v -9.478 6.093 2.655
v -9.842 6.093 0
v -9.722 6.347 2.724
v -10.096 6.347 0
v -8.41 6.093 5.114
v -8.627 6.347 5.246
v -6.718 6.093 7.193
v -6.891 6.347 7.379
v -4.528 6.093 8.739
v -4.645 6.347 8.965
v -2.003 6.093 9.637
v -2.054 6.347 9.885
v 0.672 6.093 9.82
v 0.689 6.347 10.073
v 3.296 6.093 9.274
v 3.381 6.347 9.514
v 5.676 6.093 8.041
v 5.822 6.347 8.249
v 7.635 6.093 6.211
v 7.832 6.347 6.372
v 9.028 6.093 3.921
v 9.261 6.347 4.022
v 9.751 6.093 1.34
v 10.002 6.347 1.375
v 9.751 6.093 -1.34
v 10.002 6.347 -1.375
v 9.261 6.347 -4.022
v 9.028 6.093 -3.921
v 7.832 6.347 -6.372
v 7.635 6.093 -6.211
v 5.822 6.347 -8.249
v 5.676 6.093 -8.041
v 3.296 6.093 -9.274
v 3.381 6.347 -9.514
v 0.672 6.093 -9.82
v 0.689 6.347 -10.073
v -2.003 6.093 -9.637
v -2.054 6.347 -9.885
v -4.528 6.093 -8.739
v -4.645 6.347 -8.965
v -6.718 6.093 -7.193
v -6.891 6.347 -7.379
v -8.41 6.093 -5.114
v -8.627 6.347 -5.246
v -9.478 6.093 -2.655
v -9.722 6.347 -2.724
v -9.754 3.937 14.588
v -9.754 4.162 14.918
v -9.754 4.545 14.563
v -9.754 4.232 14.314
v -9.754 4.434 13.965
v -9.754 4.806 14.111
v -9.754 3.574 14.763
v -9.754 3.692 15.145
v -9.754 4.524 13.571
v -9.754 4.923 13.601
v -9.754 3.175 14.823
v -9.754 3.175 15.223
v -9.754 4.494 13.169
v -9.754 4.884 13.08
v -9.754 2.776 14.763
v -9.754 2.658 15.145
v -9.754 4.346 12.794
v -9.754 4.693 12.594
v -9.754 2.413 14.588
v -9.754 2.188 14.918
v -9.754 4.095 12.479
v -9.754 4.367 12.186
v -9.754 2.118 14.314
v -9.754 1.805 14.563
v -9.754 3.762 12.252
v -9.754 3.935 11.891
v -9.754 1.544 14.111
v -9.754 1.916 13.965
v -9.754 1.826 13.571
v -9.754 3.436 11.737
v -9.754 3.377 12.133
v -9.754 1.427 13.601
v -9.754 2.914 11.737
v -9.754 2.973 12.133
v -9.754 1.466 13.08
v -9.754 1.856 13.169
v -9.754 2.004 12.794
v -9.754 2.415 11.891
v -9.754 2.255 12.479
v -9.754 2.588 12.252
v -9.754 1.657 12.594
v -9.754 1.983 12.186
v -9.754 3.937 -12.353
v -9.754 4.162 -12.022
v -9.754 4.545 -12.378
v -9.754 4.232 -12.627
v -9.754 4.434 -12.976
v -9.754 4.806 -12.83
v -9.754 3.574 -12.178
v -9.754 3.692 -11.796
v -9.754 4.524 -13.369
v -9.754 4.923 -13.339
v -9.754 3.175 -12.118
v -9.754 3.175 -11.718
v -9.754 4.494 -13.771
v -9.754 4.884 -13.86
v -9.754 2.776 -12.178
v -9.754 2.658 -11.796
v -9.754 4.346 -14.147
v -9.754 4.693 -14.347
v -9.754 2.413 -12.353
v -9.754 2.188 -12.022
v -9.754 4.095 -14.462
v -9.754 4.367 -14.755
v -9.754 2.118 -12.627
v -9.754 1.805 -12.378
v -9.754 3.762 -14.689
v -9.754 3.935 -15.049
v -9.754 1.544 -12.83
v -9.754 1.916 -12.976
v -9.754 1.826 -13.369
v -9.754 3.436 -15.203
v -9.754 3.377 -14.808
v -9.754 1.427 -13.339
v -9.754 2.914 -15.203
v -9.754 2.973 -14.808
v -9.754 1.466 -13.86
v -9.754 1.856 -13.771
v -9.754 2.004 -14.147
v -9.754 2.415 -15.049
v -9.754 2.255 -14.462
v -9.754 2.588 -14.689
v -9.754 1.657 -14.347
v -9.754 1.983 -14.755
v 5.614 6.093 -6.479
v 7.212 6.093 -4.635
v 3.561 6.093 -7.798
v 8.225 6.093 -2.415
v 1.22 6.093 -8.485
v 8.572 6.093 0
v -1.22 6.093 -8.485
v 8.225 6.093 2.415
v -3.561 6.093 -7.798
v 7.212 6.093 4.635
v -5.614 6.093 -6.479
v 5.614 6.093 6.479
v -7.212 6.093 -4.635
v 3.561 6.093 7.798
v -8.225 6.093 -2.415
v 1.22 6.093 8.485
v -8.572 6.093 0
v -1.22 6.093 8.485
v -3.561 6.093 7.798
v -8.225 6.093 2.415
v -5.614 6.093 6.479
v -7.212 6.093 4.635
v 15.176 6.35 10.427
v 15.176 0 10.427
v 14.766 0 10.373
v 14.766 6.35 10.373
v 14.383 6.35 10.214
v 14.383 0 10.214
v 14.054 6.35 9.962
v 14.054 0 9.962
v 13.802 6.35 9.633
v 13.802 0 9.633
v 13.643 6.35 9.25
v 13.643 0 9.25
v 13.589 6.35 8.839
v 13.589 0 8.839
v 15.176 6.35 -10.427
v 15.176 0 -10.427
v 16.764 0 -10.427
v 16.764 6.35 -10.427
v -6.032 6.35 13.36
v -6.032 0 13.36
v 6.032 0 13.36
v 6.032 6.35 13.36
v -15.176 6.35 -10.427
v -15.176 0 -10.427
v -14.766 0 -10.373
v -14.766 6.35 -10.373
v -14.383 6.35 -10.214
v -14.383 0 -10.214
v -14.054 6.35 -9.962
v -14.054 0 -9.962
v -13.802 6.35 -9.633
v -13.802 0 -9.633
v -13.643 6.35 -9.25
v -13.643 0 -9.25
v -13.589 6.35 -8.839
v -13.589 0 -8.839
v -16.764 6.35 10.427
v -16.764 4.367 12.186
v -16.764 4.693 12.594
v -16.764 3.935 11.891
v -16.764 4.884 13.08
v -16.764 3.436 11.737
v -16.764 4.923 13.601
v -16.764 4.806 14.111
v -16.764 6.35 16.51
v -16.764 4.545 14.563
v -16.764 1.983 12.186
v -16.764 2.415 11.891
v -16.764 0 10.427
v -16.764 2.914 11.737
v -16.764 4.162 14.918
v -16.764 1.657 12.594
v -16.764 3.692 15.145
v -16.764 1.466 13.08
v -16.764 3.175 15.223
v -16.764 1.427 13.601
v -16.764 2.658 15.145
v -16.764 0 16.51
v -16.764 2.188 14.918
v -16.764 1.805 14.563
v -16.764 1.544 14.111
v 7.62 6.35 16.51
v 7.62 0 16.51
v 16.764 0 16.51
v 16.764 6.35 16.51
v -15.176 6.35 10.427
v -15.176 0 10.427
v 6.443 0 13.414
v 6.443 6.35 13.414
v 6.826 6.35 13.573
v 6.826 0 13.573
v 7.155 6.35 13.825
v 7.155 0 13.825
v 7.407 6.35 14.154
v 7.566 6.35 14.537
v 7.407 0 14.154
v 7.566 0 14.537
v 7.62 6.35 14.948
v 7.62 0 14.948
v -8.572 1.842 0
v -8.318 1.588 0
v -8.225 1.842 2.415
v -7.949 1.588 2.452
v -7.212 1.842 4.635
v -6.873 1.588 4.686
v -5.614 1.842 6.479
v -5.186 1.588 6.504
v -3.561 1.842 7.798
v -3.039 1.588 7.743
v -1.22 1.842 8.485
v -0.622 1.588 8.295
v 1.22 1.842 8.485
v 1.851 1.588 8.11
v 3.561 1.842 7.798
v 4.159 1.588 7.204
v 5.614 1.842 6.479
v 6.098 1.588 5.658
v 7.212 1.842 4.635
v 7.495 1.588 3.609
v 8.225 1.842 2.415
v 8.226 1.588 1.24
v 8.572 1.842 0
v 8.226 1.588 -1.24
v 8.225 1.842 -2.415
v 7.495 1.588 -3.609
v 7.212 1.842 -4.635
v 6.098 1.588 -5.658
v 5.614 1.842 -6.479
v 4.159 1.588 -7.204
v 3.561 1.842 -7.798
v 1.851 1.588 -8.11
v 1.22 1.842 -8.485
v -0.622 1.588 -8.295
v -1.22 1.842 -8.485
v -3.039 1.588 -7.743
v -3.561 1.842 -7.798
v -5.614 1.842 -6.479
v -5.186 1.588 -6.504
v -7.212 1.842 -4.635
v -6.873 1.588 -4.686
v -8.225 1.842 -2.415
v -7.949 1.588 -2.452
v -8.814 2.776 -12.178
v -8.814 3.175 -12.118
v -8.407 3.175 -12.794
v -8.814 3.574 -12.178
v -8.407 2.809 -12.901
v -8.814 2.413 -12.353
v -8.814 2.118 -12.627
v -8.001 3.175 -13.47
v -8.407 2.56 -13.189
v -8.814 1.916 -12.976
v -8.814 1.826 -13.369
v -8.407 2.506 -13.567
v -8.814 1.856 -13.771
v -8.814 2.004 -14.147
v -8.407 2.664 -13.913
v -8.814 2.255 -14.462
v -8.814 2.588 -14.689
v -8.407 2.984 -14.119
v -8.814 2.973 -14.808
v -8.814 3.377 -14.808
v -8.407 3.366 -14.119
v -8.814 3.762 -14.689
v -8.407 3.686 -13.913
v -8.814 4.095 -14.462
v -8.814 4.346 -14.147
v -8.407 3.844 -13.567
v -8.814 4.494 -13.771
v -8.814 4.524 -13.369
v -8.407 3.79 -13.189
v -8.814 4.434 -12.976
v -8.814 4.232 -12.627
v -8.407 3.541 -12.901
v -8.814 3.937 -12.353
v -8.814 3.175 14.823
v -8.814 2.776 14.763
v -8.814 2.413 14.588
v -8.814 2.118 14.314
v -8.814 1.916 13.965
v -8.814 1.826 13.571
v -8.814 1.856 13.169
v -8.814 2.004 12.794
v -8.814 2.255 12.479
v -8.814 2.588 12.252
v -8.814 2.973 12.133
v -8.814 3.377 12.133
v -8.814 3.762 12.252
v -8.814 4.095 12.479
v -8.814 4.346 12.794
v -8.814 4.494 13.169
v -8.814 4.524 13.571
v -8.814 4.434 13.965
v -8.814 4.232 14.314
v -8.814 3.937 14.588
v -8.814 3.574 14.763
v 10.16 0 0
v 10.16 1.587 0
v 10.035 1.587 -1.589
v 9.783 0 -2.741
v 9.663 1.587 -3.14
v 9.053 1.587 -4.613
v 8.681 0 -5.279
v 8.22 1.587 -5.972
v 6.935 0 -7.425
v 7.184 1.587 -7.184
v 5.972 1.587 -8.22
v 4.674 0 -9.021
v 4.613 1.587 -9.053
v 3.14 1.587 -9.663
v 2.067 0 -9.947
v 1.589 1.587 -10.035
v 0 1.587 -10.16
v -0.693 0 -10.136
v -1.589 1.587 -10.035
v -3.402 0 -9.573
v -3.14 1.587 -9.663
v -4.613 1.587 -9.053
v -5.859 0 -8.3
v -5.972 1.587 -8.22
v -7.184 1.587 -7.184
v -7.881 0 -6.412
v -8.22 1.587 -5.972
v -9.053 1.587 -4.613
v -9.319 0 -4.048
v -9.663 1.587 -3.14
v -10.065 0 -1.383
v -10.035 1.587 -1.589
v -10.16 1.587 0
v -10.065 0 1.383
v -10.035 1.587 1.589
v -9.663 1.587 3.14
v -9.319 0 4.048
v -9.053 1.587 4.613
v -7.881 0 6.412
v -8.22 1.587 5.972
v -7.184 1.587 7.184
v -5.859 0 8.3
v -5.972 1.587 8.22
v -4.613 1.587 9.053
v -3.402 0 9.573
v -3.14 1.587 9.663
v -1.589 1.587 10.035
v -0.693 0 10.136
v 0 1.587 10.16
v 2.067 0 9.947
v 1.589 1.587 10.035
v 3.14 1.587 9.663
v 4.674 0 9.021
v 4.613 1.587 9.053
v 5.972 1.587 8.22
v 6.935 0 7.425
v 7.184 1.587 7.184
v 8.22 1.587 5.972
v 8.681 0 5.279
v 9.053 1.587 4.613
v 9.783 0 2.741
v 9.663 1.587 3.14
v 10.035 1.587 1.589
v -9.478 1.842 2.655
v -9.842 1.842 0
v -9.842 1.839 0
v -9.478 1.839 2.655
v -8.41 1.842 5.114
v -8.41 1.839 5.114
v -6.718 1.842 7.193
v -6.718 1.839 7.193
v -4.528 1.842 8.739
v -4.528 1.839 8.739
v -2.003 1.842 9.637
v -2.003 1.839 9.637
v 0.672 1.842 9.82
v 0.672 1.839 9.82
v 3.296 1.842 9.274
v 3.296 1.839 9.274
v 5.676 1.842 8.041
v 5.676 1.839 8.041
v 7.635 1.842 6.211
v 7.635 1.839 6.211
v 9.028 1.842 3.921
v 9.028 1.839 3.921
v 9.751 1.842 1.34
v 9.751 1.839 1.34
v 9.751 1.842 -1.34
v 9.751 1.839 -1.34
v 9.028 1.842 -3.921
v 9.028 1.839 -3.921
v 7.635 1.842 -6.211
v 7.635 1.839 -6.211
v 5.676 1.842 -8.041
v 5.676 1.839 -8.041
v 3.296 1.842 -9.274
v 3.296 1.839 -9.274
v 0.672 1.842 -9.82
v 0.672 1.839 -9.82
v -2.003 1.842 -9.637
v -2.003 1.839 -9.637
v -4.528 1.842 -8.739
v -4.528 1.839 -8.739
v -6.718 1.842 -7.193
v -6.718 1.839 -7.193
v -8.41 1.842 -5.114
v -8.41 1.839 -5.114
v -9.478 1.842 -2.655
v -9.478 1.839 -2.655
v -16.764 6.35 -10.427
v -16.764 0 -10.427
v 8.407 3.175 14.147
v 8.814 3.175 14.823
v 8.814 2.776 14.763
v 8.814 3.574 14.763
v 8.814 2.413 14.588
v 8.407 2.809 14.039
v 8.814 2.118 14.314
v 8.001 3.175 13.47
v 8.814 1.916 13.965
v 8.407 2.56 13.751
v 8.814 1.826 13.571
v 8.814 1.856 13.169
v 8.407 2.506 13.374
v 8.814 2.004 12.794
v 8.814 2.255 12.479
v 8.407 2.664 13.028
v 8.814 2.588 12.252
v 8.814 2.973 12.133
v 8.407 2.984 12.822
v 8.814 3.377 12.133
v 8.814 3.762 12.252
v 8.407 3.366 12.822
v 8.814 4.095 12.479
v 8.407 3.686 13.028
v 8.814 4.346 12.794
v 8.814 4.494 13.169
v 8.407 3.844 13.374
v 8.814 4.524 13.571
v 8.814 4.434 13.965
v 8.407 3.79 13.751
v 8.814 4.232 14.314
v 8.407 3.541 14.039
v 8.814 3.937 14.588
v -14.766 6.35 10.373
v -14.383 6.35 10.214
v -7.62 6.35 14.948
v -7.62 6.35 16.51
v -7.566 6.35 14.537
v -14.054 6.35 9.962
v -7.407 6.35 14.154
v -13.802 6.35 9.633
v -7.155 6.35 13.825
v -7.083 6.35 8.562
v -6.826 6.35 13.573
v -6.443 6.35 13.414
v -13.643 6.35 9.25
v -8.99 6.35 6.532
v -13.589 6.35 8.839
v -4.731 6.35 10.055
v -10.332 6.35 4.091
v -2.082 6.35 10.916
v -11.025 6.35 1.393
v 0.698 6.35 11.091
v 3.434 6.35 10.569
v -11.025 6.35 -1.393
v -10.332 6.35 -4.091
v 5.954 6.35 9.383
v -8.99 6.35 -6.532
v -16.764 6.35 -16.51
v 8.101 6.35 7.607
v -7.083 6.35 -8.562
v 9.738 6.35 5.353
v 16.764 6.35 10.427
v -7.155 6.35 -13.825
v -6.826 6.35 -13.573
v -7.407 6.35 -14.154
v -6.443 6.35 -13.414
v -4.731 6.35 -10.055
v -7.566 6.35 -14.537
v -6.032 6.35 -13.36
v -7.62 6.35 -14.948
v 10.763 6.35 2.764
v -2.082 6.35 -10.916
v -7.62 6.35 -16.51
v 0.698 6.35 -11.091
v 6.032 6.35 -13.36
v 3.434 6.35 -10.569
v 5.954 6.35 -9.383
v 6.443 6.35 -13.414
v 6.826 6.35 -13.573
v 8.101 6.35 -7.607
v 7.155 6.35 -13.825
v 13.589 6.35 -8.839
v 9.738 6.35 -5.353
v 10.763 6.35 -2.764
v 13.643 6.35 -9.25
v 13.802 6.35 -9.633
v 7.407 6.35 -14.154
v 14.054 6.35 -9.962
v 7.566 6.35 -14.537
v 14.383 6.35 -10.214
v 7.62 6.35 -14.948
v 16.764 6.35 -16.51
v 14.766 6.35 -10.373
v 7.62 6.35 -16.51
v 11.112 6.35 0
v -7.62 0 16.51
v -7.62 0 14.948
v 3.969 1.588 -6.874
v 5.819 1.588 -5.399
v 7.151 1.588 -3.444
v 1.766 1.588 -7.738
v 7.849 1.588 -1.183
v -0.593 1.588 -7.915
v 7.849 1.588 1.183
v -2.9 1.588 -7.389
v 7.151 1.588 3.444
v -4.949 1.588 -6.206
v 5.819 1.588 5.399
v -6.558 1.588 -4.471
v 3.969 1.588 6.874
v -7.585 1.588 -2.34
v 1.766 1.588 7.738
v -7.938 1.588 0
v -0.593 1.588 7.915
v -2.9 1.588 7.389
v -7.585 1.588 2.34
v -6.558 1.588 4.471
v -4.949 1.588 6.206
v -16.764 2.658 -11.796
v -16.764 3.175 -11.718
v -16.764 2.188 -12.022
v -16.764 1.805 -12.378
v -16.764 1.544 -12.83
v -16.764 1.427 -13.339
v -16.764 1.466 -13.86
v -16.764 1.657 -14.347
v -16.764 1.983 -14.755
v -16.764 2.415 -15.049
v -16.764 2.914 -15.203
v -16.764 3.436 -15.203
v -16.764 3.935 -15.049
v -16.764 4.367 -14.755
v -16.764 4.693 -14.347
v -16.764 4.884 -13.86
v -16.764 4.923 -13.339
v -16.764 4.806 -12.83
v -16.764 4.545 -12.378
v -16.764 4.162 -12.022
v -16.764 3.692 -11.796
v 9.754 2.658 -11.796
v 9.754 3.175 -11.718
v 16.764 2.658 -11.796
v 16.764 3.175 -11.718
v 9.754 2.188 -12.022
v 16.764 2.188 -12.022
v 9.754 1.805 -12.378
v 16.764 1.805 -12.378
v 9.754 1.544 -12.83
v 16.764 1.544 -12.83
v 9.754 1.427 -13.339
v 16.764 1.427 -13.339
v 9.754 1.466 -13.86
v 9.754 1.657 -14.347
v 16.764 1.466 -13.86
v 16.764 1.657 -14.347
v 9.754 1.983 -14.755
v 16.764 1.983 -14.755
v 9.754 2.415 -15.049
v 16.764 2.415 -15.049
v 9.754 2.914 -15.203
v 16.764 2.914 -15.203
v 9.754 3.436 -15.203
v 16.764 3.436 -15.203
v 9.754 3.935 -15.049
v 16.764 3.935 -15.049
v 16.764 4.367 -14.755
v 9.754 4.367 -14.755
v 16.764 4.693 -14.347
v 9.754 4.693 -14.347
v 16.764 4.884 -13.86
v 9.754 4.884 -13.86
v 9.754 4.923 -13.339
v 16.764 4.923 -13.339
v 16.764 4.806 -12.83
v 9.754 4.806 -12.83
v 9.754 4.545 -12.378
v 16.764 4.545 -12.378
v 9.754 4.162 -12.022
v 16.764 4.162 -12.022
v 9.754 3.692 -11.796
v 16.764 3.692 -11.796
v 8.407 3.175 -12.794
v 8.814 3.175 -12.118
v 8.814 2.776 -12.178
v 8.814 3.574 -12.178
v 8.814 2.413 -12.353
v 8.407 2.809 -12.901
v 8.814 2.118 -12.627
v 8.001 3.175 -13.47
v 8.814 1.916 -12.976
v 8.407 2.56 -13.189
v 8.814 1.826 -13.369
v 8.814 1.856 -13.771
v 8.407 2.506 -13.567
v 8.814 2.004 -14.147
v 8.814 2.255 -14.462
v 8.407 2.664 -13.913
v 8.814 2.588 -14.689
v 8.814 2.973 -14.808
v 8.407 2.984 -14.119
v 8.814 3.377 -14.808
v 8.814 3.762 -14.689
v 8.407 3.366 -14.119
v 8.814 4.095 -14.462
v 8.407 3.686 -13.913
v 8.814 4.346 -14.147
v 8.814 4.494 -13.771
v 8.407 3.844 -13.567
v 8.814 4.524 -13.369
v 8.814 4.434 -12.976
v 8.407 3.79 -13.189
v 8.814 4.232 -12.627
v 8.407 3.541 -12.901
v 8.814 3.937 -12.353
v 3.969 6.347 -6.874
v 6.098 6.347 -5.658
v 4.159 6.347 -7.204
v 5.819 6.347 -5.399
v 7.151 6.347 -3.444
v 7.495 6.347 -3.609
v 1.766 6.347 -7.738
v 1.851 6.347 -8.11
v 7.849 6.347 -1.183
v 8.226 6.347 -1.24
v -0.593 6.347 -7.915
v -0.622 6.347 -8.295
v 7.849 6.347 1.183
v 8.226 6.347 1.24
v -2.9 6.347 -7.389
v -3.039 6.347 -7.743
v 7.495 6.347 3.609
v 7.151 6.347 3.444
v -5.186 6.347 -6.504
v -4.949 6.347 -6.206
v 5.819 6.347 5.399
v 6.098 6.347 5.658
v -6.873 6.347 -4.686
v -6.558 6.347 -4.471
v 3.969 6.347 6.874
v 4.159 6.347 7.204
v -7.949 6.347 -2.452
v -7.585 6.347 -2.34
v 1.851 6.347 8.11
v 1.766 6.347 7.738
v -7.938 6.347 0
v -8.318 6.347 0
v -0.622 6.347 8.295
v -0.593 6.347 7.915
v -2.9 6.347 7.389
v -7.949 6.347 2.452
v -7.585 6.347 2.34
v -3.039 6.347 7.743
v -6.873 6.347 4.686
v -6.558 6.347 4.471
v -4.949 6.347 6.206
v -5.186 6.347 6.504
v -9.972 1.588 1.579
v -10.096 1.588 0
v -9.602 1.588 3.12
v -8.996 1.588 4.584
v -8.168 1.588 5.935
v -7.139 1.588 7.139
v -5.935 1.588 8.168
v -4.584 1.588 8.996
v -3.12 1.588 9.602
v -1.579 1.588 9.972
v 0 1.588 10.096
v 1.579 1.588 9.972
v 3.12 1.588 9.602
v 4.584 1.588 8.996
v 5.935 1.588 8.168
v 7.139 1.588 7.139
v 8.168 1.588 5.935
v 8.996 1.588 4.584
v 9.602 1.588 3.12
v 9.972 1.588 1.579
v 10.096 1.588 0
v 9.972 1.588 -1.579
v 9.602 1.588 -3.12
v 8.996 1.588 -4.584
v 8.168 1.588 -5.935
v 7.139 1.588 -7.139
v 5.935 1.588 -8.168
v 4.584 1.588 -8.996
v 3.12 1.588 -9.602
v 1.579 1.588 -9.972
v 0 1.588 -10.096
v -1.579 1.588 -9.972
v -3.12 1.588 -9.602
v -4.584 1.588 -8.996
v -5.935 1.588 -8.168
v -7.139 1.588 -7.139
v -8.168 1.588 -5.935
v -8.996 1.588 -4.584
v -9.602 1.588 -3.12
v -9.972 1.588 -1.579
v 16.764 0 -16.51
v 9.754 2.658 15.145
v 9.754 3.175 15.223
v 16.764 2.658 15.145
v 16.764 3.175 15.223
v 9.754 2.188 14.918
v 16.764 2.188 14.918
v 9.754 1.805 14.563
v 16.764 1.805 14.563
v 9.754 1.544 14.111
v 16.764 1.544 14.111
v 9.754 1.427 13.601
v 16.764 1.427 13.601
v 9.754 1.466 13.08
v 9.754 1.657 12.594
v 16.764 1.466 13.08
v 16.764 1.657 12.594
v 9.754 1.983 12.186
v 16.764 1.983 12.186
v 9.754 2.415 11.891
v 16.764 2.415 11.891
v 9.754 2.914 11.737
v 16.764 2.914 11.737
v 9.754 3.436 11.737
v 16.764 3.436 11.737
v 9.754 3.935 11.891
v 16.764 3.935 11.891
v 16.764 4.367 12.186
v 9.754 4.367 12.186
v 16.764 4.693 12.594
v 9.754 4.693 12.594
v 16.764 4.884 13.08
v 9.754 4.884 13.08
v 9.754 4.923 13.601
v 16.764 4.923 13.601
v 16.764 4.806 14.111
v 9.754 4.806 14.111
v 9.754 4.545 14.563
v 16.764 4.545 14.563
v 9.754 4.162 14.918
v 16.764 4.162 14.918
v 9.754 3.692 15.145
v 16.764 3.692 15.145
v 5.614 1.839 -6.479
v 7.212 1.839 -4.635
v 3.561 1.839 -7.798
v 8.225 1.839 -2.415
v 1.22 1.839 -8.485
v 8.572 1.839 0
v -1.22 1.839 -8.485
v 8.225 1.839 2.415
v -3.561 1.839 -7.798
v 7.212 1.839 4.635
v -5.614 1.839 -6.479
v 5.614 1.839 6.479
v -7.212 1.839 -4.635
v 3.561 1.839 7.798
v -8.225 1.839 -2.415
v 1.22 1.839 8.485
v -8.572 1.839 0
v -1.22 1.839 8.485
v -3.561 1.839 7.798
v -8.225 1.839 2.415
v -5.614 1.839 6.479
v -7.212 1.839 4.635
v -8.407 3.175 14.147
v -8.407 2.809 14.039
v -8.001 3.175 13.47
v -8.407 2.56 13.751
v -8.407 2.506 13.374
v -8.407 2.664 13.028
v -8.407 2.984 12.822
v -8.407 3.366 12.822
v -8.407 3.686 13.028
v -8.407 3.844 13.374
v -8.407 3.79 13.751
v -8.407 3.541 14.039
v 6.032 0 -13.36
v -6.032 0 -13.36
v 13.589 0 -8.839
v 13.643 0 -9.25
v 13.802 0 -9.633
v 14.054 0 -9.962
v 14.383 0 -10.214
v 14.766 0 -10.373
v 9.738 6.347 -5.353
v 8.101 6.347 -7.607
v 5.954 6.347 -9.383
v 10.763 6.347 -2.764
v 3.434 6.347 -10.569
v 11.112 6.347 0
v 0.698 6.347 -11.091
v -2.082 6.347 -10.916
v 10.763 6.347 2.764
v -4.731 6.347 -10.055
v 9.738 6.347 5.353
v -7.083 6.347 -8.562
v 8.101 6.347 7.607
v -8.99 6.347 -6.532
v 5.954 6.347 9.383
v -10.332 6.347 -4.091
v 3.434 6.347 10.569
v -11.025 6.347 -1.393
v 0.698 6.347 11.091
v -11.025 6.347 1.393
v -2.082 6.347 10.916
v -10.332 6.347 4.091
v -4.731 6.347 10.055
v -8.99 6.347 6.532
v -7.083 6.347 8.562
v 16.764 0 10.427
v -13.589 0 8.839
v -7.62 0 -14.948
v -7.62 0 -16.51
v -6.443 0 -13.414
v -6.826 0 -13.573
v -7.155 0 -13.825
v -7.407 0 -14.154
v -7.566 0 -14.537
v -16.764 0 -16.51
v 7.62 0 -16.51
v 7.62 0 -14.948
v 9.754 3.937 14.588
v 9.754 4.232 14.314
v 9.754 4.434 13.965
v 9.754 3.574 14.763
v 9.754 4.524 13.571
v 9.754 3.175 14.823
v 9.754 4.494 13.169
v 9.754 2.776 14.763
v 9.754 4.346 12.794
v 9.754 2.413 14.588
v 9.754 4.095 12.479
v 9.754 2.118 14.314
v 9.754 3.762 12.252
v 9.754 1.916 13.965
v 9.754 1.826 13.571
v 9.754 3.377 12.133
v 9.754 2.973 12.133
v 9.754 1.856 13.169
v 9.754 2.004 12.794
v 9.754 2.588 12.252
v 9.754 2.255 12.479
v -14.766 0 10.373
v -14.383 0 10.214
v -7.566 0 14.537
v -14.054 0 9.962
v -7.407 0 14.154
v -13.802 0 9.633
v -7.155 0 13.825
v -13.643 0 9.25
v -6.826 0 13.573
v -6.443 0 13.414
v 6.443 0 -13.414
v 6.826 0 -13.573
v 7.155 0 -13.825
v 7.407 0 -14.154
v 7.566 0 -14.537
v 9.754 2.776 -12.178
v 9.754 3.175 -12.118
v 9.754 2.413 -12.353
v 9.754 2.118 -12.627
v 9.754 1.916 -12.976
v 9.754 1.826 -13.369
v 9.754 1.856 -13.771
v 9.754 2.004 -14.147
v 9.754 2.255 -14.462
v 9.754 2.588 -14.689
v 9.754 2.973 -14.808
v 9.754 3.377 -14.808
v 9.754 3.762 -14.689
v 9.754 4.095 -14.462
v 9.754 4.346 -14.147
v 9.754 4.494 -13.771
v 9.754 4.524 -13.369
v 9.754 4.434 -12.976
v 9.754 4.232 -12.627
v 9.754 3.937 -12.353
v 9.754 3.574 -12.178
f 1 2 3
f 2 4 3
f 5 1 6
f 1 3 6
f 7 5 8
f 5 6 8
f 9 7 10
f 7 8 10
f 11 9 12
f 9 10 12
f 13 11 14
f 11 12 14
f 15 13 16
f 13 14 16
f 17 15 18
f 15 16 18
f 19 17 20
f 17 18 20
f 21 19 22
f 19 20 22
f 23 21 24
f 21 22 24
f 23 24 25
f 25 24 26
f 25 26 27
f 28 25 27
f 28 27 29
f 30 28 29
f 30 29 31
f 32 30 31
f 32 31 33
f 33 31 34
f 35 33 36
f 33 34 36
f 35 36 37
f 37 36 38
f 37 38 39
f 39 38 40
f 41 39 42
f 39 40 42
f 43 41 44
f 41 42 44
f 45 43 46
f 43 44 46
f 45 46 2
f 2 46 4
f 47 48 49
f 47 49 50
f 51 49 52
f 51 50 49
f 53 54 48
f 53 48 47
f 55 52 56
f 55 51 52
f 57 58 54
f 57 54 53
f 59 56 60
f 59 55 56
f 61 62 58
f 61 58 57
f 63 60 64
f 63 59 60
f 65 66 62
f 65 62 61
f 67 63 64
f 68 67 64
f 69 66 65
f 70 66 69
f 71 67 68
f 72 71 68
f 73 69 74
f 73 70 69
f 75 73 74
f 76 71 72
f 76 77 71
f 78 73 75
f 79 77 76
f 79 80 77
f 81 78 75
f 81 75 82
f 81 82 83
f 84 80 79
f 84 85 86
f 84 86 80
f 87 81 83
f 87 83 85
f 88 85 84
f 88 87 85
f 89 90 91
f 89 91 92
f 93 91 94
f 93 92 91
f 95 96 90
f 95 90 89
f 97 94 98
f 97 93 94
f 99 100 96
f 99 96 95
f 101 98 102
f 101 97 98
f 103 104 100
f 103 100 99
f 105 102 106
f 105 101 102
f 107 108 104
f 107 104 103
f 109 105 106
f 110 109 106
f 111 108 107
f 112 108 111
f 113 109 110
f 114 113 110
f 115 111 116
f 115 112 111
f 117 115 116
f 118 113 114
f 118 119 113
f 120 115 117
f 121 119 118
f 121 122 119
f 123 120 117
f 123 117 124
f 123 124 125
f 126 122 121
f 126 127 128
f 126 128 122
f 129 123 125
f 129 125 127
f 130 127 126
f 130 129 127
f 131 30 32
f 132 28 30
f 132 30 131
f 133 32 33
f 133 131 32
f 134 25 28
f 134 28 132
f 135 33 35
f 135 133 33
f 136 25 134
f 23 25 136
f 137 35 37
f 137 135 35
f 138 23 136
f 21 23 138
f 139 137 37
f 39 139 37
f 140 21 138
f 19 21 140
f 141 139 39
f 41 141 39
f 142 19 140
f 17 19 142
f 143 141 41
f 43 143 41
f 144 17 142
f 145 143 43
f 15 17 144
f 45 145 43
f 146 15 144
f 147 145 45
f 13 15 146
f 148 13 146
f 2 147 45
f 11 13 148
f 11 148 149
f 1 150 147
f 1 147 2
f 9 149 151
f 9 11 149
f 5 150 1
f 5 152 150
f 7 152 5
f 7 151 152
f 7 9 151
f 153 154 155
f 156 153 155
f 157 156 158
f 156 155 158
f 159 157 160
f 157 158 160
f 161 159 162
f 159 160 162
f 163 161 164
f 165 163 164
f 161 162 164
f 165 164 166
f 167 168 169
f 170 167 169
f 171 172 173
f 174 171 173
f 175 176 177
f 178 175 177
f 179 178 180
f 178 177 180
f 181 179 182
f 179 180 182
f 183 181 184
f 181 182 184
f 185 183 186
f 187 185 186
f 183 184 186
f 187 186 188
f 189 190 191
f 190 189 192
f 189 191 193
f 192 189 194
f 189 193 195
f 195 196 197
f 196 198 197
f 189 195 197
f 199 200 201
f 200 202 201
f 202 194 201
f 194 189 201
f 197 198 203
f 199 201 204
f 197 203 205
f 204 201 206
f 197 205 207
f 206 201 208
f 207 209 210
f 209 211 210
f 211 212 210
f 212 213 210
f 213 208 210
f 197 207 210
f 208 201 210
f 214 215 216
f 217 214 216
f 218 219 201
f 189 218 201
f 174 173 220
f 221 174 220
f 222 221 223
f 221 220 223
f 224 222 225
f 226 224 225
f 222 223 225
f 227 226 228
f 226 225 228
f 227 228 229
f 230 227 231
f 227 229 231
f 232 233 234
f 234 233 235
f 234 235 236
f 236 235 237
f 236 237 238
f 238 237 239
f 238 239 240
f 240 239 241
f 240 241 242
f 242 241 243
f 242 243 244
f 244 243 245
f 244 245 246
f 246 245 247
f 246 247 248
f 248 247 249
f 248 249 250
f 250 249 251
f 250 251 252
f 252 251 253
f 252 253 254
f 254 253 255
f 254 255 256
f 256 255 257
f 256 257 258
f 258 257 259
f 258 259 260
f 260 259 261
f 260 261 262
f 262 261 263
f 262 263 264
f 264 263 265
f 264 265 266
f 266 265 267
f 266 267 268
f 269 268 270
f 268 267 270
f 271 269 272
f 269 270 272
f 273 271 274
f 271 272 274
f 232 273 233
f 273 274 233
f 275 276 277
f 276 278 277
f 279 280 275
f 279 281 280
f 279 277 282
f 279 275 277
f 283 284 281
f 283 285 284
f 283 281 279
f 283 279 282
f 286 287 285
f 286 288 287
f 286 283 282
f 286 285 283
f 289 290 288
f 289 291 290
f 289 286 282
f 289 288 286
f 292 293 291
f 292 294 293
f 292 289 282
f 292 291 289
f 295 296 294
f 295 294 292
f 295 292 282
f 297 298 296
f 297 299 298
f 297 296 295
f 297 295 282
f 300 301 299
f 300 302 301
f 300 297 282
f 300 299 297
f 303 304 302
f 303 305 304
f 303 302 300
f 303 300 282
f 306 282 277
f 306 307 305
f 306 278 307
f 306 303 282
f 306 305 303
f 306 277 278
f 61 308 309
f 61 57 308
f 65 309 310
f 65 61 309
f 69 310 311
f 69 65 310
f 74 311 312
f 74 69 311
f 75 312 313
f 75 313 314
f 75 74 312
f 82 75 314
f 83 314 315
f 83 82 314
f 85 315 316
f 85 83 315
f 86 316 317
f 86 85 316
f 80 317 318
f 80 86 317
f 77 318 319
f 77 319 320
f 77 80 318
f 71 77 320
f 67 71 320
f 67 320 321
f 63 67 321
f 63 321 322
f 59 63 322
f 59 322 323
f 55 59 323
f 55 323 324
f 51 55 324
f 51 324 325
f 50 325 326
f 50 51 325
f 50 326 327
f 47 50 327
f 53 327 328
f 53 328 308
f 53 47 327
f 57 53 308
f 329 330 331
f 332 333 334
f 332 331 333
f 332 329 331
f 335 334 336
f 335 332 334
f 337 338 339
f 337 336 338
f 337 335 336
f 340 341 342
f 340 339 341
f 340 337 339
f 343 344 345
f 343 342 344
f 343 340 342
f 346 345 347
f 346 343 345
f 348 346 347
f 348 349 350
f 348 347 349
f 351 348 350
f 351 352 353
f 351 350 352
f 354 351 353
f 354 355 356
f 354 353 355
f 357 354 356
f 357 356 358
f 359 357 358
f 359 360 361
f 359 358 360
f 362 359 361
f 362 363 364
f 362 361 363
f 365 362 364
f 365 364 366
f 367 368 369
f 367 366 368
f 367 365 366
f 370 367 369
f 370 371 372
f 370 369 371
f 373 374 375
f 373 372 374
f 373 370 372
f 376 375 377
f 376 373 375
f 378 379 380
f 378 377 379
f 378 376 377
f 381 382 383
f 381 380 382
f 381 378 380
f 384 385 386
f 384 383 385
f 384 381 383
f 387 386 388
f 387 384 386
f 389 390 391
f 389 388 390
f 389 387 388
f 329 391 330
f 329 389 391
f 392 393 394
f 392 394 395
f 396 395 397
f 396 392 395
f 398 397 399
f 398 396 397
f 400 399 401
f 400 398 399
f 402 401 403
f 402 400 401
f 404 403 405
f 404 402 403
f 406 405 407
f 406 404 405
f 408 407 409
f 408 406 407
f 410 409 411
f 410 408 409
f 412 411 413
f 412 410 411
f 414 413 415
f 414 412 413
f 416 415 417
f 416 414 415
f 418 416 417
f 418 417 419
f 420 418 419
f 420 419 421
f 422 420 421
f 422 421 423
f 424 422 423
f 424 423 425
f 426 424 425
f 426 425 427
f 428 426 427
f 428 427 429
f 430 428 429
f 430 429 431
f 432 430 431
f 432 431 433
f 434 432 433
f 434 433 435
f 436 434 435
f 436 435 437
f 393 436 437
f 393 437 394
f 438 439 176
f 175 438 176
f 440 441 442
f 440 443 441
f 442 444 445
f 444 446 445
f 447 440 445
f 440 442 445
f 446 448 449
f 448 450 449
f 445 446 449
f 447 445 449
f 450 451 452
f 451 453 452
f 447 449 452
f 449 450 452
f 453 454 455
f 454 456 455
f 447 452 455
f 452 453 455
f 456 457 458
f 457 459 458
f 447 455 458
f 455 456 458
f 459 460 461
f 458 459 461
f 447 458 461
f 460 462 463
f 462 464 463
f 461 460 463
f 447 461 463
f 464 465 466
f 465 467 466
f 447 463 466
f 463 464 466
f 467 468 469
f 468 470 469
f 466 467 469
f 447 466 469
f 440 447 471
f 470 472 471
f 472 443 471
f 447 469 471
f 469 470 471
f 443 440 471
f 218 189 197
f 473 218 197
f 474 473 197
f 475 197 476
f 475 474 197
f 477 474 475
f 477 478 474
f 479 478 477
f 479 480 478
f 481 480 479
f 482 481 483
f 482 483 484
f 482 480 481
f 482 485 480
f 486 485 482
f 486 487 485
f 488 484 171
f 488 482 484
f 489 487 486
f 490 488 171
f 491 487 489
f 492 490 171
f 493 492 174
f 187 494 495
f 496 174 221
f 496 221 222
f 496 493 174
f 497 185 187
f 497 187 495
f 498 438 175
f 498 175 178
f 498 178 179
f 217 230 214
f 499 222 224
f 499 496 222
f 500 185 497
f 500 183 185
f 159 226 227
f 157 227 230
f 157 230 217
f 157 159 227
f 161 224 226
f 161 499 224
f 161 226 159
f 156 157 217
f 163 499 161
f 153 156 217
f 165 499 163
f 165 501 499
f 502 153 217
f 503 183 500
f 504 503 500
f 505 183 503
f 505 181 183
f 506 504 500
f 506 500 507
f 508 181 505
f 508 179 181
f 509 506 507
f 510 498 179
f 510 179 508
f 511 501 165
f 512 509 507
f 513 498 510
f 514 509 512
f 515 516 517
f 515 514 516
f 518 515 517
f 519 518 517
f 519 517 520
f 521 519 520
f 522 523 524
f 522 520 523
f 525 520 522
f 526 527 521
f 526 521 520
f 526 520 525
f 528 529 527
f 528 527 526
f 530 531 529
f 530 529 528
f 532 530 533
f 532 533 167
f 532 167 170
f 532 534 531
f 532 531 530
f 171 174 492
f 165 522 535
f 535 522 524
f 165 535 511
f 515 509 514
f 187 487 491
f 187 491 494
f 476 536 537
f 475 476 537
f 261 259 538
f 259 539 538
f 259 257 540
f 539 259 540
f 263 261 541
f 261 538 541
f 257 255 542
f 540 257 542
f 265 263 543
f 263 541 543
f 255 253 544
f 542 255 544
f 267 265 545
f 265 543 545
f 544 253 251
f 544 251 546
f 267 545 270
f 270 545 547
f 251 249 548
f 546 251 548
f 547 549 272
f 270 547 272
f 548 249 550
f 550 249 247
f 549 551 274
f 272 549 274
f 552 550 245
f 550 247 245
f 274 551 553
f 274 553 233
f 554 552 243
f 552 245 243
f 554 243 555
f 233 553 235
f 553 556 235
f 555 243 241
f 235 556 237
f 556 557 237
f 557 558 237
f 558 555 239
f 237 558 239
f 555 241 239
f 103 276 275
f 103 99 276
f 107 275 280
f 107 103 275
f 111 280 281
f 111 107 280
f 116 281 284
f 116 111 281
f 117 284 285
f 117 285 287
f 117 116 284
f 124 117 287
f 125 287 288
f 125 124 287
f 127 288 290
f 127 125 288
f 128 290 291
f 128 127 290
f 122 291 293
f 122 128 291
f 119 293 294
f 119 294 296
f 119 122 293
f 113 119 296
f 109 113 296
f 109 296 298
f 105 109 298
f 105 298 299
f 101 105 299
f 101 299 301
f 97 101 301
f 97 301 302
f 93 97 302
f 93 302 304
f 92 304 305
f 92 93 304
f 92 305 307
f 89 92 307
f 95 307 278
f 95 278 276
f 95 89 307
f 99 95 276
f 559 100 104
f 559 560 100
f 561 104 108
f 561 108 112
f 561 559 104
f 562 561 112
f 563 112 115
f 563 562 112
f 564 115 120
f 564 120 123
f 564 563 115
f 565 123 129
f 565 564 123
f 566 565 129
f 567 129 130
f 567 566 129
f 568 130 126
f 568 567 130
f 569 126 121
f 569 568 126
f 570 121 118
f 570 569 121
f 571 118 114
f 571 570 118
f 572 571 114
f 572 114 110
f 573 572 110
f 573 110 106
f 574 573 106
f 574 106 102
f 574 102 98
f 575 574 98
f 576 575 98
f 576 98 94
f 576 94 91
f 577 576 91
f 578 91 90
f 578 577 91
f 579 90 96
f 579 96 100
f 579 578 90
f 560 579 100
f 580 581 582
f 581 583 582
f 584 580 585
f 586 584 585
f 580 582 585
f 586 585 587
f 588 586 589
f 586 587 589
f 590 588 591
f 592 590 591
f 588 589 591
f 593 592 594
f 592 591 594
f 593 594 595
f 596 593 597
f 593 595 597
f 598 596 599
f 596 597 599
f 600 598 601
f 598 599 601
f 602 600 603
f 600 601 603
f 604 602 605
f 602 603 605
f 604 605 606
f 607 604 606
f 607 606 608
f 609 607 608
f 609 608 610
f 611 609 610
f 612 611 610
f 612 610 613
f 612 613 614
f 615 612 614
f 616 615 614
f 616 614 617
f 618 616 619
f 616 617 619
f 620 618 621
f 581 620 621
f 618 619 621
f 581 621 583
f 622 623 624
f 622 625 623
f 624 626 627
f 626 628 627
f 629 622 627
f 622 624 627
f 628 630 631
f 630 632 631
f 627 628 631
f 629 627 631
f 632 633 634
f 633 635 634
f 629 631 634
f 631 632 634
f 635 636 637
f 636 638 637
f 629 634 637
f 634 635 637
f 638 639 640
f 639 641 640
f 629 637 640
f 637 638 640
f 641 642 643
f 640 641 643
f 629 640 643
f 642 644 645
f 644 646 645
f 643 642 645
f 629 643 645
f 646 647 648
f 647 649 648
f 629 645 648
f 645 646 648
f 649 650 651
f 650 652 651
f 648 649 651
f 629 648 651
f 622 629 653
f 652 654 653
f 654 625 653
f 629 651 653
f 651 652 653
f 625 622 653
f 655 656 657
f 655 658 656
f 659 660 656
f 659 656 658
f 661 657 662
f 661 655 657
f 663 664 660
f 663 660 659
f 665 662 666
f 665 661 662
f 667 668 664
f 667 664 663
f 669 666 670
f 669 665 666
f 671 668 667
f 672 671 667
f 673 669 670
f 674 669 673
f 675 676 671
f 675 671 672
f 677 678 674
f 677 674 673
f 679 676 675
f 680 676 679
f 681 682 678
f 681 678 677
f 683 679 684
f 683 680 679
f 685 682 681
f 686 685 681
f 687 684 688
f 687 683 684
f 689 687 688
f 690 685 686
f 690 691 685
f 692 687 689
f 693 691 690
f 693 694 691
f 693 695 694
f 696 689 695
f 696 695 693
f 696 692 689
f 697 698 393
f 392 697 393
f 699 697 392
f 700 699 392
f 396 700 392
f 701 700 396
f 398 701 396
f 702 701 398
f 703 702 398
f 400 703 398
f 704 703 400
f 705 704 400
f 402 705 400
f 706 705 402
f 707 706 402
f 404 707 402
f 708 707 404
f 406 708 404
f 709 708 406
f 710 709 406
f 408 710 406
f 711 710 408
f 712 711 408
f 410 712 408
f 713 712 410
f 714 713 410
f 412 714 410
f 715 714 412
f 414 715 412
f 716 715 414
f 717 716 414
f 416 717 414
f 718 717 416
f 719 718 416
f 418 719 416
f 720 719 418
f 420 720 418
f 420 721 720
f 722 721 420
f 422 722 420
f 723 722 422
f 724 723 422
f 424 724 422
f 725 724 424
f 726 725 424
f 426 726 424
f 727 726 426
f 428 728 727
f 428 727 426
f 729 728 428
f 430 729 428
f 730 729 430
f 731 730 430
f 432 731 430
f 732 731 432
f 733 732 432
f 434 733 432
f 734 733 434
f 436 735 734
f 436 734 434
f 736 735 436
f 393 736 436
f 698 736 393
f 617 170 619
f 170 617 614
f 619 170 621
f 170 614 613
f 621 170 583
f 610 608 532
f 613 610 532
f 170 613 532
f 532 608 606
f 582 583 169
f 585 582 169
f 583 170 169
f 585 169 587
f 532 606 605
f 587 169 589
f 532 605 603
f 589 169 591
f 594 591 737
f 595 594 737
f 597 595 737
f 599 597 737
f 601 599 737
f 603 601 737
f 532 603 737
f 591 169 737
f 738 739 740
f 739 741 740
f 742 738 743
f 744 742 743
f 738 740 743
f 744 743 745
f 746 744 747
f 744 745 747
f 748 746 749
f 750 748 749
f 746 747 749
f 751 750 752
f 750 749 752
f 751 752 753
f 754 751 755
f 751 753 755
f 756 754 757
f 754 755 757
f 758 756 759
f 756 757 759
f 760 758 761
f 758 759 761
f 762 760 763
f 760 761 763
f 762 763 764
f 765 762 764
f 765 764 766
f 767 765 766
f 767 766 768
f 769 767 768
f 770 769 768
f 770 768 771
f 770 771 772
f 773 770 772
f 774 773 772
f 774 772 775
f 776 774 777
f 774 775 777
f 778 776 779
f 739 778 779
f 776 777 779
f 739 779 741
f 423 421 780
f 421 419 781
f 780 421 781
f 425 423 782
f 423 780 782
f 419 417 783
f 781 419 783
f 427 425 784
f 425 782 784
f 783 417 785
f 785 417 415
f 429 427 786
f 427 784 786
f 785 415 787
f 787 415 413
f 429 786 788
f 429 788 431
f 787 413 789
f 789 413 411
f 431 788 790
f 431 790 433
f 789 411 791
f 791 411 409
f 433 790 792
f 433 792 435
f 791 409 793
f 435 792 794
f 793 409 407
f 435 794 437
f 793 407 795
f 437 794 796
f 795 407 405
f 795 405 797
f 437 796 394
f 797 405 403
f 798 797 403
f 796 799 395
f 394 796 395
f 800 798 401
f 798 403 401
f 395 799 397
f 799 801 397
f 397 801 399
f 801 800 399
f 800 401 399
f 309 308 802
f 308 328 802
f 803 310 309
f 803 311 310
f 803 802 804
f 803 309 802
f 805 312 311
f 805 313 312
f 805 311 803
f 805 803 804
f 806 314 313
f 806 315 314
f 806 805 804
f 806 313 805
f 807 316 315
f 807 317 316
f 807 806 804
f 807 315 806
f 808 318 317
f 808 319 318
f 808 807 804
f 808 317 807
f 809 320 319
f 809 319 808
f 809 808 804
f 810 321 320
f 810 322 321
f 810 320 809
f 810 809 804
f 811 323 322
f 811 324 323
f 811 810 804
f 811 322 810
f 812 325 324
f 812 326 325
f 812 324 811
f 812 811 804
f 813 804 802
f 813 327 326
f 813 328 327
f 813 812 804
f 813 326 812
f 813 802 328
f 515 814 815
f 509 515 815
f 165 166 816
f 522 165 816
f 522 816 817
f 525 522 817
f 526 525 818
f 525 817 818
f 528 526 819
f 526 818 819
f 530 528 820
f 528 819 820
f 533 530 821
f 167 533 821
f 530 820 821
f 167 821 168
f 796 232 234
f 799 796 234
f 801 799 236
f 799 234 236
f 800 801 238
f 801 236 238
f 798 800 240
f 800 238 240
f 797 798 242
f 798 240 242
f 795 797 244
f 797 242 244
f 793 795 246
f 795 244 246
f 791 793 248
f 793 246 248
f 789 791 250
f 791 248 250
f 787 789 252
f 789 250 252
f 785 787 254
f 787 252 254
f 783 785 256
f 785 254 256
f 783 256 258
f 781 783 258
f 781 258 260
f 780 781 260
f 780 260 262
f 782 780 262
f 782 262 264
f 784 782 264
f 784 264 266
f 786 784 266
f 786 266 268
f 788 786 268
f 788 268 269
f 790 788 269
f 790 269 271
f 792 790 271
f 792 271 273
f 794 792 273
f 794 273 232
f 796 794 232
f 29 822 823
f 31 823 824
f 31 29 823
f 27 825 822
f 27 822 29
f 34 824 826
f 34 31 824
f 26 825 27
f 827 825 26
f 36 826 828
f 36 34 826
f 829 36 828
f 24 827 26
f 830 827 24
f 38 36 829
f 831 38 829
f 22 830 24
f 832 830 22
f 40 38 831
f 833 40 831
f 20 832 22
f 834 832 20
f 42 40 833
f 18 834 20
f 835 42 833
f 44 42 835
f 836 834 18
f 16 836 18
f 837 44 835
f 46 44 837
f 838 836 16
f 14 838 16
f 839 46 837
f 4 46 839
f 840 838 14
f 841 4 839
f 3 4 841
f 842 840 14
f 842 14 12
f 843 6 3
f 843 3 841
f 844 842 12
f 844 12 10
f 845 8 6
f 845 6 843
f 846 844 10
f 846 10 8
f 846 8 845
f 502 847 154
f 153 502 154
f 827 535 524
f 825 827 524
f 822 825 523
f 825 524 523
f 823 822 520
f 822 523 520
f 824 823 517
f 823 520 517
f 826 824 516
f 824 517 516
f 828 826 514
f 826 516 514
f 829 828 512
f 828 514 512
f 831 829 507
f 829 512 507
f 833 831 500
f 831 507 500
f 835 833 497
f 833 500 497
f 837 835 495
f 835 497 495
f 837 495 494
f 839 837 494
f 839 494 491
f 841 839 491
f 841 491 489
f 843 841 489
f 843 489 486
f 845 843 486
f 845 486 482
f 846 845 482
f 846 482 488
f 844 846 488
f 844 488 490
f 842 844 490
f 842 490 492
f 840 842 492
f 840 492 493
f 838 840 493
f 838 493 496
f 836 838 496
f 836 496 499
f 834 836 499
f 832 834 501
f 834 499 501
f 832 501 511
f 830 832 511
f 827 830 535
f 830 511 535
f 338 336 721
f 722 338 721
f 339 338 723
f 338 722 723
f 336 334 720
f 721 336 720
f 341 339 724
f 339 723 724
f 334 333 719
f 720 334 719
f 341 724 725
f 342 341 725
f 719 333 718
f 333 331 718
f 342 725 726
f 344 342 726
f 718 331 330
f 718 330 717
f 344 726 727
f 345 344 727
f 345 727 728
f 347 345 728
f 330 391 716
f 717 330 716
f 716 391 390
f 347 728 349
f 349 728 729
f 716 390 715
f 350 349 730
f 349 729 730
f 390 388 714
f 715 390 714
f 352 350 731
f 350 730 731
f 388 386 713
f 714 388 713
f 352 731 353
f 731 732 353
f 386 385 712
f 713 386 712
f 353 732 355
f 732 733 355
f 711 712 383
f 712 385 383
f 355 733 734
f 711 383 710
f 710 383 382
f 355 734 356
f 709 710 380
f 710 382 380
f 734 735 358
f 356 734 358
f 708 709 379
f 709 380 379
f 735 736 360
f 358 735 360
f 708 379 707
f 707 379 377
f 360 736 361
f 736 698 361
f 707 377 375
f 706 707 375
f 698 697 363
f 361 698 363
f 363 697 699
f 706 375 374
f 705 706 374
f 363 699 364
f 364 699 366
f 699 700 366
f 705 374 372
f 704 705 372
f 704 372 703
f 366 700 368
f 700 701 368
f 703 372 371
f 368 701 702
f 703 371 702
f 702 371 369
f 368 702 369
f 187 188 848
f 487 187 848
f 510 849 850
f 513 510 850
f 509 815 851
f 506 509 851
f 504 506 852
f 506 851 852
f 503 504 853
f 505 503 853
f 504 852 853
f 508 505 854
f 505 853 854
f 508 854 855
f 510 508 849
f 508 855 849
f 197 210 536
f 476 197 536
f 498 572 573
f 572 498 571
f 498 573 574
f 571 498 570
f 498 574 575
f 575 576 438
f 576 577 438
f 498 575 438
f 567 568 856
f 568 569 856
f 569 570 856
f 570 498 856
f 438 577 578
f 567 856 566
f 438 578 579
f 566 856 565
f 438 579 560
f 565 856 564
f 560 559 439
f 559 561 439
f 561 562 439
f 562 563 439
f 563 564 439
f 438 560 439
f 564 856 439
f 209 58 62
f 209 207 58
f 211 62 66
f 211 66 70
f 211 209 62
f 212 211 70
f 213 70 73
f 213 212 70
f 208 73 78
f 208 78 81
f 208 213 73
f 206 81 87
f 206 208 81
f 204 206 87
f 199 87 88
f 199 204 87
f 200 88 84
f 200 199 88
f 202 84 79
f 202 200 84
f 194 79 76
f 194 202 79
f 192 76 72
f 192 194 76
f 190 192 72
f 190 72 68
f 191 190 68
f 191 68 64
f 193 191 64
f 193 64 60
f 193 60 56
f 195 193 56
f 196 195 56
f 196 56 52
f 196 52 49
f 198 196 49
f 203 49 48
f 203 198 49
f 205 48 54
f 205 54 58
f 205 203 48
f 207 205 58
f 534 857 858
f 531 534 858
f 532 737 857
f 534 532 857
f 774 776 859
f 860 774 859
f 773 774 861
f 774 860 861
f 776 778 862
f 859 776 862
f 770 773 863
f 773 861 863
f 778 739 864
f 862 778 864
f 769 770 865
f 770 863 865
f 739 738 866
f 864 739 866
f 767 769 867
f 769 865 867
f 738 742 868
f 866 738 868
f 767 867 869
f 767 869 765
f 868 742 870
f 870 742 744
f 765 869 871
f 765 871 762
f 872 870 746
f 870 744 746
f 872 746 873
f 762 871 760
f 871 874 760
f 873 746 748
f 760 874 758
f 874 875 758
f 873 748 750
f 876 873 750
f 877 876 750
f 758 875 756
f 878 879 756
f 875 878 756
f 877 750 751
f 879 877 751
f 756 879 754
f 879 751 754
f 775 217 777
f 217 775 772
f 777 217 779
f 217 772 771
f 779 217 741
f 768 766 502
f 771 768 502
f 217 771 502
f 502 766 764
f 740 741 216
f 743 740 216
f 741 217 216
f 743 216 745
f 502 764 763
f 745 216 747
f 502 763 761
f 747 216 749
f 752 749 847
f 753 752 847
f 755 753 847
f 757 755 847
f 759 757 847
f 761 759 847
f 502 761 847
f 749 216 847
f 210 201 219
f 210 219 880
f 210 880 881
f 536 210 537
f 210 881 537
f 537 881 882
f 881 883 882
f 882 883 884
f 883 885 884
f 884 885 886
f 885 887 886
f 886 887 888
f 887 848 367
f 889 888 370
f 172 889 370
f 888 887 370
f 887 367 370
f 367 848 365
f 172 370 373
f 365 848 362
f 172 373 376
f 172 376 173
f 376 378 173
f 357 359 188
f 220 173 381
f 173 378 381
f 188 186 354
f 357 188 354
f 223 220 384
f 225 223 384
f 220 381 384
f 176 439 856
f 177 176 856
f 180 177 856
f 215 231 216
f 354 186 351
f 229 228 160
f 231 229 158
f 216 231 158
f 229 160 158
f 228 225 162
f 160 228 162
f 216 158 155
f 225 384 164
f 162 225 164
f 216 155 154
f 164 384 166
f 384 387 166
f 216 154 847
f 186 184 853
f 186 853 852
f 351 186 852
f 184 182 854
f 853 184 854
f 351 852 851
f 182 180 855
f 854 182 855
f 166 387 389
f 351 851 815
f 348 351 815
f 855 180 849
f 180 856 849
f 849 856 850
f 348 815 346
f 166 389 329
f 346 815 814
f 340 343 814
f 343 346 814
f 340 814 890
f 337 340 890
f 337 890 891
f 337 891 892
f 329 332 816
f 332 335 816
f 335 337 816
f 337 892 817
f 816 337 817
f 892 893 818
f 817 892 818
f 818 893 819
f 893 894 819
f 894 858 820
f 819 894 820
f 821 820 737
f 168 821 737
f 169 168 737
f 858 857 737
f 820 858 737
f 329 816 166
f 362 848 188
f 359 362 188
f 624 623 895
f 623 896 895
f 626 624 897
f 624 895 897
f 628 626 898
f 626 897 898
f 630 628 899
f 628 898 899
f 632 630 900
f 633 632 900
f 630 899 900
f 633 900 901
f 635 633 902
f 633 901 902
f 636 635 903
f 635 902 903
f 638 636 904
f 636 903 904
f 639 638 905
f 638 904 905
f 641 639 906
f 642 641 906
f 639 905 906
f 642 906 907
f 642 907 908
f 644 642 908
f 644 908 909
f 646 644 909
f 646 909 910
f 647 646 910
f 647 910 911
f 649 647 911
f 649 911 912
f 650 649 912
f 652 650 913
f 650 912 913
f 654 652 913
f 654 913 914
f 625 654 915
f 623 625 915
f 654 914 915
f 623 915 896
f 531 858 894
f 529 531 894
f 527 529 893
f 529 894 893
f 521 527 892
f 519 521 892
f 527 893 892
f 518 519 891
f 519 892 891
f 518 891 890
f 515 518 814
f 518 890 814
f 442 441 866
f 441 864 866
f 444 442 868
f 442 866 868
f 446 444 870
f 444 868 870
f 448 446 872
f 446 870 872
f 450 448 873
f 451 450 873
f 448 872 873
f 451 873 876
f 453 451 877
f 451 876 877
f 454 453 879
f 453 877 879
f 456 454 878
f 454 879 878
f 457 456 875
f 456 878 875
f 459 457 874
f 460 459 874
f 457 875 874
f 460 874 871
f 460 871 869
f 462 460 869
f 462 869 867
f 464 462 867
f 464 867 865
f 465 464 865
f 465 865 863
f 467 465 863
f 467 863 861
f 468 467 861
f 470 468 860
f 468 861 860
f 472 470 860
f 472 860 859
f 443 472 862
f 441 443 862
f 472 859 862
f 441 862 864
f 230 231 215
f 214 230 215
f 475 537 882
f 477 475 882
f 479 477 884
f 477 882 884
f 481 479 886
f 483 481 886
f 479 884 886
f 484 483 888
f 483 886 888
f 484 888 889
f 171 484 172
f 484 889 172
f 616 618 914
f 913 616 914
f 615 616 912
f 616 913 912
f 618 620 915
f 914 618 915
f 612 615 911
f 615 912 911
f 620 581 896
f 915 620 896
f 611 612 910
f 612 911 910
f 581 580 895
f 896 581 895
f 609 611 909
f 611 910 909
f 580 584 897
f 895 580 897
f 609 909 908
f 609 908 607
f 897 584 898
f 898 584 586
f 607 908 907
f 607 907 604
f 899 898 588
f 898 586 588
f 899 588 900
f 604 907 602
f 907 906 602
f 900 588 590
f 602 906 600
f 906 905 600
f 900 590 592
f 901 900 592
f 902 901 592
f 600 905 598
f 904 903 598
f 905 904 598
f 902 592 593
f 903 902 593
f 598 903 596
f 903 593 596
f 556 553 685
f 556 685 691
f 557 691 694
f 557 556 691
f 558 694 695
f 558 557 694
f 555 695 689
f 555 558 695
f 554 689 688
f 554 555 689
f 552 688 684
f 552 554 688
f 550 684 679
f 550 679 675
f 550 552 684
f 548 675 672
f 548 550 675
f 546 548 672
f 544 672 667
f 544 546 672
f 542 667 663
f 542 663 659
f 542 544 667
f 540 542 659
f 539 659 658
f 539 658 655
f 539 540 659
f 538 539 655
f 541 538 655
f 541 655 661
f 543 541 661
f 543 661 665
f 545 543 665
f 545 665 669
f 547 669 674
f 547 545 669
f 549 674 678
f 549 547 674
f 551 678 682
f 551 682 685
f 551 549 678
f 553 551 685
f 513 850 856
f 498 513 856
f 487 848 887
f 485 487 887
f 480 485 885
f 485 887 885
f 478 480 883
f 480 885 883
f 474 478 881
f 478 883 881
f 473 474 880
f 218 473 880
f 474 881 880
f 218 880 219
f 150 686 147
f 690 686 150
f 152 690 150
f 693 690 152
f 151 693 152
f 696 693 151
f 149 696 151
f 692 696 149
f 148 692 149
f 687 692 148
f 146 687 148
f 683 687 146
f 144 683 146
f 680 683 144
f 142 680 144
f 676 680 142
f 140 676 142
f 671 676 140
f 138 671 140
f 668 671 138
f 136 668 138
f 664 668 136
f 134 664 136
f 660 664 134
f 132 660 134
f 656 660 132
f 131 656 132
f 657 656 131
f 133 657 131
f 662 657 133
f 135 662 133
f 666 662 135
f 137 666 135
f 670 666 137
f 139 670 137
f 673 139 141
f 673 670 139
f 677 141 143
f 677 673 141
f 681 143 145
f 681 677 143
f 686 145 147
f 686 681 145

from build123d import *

# Parameters (mm, degrees)
SKETCH1_R                      = 10.16
BOSS_EXTRUDE1_DEPTH            = 6.35
SKETCH2_R                      = 11.1125
CUT_EXTRUDE1_DEPTH             = 4.7625
SKETCH3_R                      = 11.1125
SKETCH3_R_2                    = 9.8425
BOSS_EXTRUDE2_DEPTH            = 4.75996
CHAMFER1_SIZE                  = 0.254
SKETCH4_R                      = 8.5725
SKETCH4_R_2                    = 7.9375
BOSS_EXTRUDE3_DEPTH            = 4.75996
CHAMFER2_SIZE                  = 0.254
SKETCH5_R                      = 9.8425
SKETCH5_R_2                    = 8.5725
BOSS_EXTRUDE4_DEPTH            = 4.2545
F_6_32_TAPPED_HOLE1_AT_2_COUNT = 2
F_6_32_TAPPED_HOLE1_AT_2_PITCH = 26.940768363


with BuildPart() as part:
    # Sketch1 → Boss-Extrude1 (new body)
    with BuildSketch(Plane(origin=(0, 0, 0), x_dir=(1, 0, 0), z_dir=(0, 1, 0))):
        with BuildLine():
            Line((-16.764, -16.51), (-7.62, -16.51))
            Line((-7.62, -16.51), (-7.62, -14.9479))
            ThreePointArc((-7.62, -14.9479), (-7.155032015, -13.825367985), (-6.0325, -13.3604))
            Line((-6.0325, -13.3604), (6.0325, -13.3604))
            ThreePointArc((6.0325, -13.3604), (7.155032015, -13.825367985), (7.62, -14.9479))
            Line((7.62, -14.9479), (7.62, -16.51))
            Line((7.62, -16.51), (16.764, -16.51))
            Line((16.764, -16.51), (16.764, -10.4267))
            Line((16.764, -10.4267), (15.1765, -10.4267))
            ThreePointArc((15.1765, -10.4267), (14.053967985, -9.961732015), (13.589, -8.8392))
            Line((13.589, -8.8392), (13.589, 8.8392))
            ThreePointArc((13.589, 8.8392), (14.053967985, 9.961732015), (15.1765, 10.4267))
            Line((15.1765, 10.4267), (16.764, 10.4267))
            Line((16.764, 10.4267), (16.764, 16.51))
            Line((16.764, 16.51), (7.62, 16.51))
            Line((7.62, 16.51), (7.62, 14.9479))
            ThreePointArc((7.62, 14.9479), (7.155032015, 13.825367985), (6.0325, 13.3604))
            Line((6.0325, 13.3604), (-6.0325, 13.3604))
            ThreePointArc((-6.0325, 13.3604), (-7.155032015, 13.825367985), (-7.62, 14.9479))
            Line((-7.62, 14.9479), (-7.62, 16.51))
            Line((-7.62, 16.51), (-16.764, 16.51))
            Line((-16.764, 16.51), (-16.764, 10.4267))
            Line((-16.764, 10.4267), (-15.1765, 10.4267))
            ThreePointArc((-15.1765, 10.4267), (-14.053967985, 9.961732015), (-13.589, 8.8392))
            Line((-13.589, 8.8392), (-13.589, -8.8392))
            ThreePointArc((-13.589, -8.8392), (-14.053967985, -9.961732015), (-15.1765, -10.4267))
            Line((-15.1765, -10.4267), (-16.764, -10.4267))
            Line((-16.764, -10.4267), (-16.764, -16.51))
        make_face()
        Circle(SKETCH1_R, mode=Mode.SUBTRACT)
    extrude(amount=BOSS_EXTRUDE1_DEPTH)

    # Sketch2 → Cut-Extrude1 (cut)
    with BuildSketch(Plane(origin=(0, 6.35, 0), x_dir=(1, 0, 0), z_dir=(0, 1, 0))):
        Circle(SKETCH2_R)
    extrude(amount=-CUT_EXTRUDE1_DEPTH, mode=Mode.SUBTRACT)

    # Sketch3 → Boss-Extrude2 (add)
    with BuildSketch(Plane(origin=(0, 1.5875, 0), x_dir=(-1, 0, 0), z_dir=(0, 1, 0))):
        Circle(SKETCH3_R)
        Circle(SKETCH3_R_2, mode=Mode.SUBTRACT)
    extrude(amount=BOSS_EXTRUDE2_DEPTH)

    # Chamfer1
    chamfer1_edges = [part.edges().sort_by_distance(p)[0] for p in [
        (9.8425, 1.5875, 0),
        (9.8425, 6.34746, 0),
    ]]
    chamfer(chamfer1_edges, length=CHAMFER1_SIZE)



with BuildPart() as body_2:
    # Sketch4 → Boss-Extrude3 (new body)
    with BuildSketch(Plane(origin=(0, 1.5875, 0), x_dir=(-1, 0, 0), z_dir=(0, 1, 0))):
        Circle(SKETCH4_R)
        Circle(SKETCH4_R_2, mode=Mode.SUBTRACT)
    extrude(amount=BOSS_EXTRUDE3_DEPTH)

    # Chamfer2
    chamfer2_edges = [body_2.edges().sort_by_distance(p)[0] for p in [
        (8.5725, 1.5875, 0),
        (8.5725, 6.34746, 0),
    ]]
    chamfer(chamfer2_edges, length=CHAMFER2_SIZE)


with BuildPart() as part_1:
    add(part.part)

    add(body_2.part)  # Boss-Extrude4 merges body 2
    # Sketch5 → Boss-Extrude4 (add)
    with BuildSketch(Plane(origin=(0, 6.09346, 0), x_dir=(-1, 0, 0), z_dir=(0, 1, 0))):
        Circle(SKETCH5_R)
        Circle(SKETCH5_R_2, mode=Mode.SUBTRACT)
    extrude(amount=-BOSS_EXTRUDE4_DEPTH)

    # Sketch8 → #6-32 Tapped Hole1 (revolve, cut)
    with BuildSketch(Plane(origin=(-16.764, 3.175, -13.470384182), x_dir=(0, 0, 1), z_dir=(0, 1, 0))):
        Polygon((0, 0), (0, 8.76289403), (1.35255, 7.9502), (1.35255, 7.0104), (1.7526, 7.0104), (1.7526, 0), align=None)
    f_6_32_tapped_hole1 = revolve(axis=Axis((-23.114, 3.175, -13.470384182), (1, 0, 0)), mode=Mode.SUBTRACT)

    # #6-32 Tapped Hole1 at 2: #6-32 Tapped Hole1 ×2
    with Locations(*[(0, 0, i * F_6_32_TAPPED_HOLE1_AT_2_PITCH) for i in range(1, F_6_32_TAPPED_HOLE1_AT_2_COUNT)]):
        add(f_6_32_tapped_hole1, mode=Mode.SUBTRACT)

    # Mirror1: #6-32 Tapped Hole1 across plane
    add(f_6_32_tapped_hole1.mirror(Plane(origin=(0, 0, 0), x_dir=(0, 0, 1), z_dir=(1, 0, 0))), mode=Mode.SUBTRACT)

    # Mirror1 copy 1 sketch → Mirror1 copy 1 (revolve, cut)
    with BuildSketch(Plane(origin=(16.764, 3.175, 13.470384182), x_dir=(0, 0, 1), z_dir=(0, 1, 0))):
        Polygon((0, 0), (0, -8.76289403), (1.35255, -7.9502), (1.35255, -7.0104), (1.7526, -7.0104), (1.7526, 0), align=None)
    revolve(axis=Axis((23.114, 3.175, 13.470384182), (1, 0, 0)), mode=Mode.SUBTRACT)


solid = part_1.part
